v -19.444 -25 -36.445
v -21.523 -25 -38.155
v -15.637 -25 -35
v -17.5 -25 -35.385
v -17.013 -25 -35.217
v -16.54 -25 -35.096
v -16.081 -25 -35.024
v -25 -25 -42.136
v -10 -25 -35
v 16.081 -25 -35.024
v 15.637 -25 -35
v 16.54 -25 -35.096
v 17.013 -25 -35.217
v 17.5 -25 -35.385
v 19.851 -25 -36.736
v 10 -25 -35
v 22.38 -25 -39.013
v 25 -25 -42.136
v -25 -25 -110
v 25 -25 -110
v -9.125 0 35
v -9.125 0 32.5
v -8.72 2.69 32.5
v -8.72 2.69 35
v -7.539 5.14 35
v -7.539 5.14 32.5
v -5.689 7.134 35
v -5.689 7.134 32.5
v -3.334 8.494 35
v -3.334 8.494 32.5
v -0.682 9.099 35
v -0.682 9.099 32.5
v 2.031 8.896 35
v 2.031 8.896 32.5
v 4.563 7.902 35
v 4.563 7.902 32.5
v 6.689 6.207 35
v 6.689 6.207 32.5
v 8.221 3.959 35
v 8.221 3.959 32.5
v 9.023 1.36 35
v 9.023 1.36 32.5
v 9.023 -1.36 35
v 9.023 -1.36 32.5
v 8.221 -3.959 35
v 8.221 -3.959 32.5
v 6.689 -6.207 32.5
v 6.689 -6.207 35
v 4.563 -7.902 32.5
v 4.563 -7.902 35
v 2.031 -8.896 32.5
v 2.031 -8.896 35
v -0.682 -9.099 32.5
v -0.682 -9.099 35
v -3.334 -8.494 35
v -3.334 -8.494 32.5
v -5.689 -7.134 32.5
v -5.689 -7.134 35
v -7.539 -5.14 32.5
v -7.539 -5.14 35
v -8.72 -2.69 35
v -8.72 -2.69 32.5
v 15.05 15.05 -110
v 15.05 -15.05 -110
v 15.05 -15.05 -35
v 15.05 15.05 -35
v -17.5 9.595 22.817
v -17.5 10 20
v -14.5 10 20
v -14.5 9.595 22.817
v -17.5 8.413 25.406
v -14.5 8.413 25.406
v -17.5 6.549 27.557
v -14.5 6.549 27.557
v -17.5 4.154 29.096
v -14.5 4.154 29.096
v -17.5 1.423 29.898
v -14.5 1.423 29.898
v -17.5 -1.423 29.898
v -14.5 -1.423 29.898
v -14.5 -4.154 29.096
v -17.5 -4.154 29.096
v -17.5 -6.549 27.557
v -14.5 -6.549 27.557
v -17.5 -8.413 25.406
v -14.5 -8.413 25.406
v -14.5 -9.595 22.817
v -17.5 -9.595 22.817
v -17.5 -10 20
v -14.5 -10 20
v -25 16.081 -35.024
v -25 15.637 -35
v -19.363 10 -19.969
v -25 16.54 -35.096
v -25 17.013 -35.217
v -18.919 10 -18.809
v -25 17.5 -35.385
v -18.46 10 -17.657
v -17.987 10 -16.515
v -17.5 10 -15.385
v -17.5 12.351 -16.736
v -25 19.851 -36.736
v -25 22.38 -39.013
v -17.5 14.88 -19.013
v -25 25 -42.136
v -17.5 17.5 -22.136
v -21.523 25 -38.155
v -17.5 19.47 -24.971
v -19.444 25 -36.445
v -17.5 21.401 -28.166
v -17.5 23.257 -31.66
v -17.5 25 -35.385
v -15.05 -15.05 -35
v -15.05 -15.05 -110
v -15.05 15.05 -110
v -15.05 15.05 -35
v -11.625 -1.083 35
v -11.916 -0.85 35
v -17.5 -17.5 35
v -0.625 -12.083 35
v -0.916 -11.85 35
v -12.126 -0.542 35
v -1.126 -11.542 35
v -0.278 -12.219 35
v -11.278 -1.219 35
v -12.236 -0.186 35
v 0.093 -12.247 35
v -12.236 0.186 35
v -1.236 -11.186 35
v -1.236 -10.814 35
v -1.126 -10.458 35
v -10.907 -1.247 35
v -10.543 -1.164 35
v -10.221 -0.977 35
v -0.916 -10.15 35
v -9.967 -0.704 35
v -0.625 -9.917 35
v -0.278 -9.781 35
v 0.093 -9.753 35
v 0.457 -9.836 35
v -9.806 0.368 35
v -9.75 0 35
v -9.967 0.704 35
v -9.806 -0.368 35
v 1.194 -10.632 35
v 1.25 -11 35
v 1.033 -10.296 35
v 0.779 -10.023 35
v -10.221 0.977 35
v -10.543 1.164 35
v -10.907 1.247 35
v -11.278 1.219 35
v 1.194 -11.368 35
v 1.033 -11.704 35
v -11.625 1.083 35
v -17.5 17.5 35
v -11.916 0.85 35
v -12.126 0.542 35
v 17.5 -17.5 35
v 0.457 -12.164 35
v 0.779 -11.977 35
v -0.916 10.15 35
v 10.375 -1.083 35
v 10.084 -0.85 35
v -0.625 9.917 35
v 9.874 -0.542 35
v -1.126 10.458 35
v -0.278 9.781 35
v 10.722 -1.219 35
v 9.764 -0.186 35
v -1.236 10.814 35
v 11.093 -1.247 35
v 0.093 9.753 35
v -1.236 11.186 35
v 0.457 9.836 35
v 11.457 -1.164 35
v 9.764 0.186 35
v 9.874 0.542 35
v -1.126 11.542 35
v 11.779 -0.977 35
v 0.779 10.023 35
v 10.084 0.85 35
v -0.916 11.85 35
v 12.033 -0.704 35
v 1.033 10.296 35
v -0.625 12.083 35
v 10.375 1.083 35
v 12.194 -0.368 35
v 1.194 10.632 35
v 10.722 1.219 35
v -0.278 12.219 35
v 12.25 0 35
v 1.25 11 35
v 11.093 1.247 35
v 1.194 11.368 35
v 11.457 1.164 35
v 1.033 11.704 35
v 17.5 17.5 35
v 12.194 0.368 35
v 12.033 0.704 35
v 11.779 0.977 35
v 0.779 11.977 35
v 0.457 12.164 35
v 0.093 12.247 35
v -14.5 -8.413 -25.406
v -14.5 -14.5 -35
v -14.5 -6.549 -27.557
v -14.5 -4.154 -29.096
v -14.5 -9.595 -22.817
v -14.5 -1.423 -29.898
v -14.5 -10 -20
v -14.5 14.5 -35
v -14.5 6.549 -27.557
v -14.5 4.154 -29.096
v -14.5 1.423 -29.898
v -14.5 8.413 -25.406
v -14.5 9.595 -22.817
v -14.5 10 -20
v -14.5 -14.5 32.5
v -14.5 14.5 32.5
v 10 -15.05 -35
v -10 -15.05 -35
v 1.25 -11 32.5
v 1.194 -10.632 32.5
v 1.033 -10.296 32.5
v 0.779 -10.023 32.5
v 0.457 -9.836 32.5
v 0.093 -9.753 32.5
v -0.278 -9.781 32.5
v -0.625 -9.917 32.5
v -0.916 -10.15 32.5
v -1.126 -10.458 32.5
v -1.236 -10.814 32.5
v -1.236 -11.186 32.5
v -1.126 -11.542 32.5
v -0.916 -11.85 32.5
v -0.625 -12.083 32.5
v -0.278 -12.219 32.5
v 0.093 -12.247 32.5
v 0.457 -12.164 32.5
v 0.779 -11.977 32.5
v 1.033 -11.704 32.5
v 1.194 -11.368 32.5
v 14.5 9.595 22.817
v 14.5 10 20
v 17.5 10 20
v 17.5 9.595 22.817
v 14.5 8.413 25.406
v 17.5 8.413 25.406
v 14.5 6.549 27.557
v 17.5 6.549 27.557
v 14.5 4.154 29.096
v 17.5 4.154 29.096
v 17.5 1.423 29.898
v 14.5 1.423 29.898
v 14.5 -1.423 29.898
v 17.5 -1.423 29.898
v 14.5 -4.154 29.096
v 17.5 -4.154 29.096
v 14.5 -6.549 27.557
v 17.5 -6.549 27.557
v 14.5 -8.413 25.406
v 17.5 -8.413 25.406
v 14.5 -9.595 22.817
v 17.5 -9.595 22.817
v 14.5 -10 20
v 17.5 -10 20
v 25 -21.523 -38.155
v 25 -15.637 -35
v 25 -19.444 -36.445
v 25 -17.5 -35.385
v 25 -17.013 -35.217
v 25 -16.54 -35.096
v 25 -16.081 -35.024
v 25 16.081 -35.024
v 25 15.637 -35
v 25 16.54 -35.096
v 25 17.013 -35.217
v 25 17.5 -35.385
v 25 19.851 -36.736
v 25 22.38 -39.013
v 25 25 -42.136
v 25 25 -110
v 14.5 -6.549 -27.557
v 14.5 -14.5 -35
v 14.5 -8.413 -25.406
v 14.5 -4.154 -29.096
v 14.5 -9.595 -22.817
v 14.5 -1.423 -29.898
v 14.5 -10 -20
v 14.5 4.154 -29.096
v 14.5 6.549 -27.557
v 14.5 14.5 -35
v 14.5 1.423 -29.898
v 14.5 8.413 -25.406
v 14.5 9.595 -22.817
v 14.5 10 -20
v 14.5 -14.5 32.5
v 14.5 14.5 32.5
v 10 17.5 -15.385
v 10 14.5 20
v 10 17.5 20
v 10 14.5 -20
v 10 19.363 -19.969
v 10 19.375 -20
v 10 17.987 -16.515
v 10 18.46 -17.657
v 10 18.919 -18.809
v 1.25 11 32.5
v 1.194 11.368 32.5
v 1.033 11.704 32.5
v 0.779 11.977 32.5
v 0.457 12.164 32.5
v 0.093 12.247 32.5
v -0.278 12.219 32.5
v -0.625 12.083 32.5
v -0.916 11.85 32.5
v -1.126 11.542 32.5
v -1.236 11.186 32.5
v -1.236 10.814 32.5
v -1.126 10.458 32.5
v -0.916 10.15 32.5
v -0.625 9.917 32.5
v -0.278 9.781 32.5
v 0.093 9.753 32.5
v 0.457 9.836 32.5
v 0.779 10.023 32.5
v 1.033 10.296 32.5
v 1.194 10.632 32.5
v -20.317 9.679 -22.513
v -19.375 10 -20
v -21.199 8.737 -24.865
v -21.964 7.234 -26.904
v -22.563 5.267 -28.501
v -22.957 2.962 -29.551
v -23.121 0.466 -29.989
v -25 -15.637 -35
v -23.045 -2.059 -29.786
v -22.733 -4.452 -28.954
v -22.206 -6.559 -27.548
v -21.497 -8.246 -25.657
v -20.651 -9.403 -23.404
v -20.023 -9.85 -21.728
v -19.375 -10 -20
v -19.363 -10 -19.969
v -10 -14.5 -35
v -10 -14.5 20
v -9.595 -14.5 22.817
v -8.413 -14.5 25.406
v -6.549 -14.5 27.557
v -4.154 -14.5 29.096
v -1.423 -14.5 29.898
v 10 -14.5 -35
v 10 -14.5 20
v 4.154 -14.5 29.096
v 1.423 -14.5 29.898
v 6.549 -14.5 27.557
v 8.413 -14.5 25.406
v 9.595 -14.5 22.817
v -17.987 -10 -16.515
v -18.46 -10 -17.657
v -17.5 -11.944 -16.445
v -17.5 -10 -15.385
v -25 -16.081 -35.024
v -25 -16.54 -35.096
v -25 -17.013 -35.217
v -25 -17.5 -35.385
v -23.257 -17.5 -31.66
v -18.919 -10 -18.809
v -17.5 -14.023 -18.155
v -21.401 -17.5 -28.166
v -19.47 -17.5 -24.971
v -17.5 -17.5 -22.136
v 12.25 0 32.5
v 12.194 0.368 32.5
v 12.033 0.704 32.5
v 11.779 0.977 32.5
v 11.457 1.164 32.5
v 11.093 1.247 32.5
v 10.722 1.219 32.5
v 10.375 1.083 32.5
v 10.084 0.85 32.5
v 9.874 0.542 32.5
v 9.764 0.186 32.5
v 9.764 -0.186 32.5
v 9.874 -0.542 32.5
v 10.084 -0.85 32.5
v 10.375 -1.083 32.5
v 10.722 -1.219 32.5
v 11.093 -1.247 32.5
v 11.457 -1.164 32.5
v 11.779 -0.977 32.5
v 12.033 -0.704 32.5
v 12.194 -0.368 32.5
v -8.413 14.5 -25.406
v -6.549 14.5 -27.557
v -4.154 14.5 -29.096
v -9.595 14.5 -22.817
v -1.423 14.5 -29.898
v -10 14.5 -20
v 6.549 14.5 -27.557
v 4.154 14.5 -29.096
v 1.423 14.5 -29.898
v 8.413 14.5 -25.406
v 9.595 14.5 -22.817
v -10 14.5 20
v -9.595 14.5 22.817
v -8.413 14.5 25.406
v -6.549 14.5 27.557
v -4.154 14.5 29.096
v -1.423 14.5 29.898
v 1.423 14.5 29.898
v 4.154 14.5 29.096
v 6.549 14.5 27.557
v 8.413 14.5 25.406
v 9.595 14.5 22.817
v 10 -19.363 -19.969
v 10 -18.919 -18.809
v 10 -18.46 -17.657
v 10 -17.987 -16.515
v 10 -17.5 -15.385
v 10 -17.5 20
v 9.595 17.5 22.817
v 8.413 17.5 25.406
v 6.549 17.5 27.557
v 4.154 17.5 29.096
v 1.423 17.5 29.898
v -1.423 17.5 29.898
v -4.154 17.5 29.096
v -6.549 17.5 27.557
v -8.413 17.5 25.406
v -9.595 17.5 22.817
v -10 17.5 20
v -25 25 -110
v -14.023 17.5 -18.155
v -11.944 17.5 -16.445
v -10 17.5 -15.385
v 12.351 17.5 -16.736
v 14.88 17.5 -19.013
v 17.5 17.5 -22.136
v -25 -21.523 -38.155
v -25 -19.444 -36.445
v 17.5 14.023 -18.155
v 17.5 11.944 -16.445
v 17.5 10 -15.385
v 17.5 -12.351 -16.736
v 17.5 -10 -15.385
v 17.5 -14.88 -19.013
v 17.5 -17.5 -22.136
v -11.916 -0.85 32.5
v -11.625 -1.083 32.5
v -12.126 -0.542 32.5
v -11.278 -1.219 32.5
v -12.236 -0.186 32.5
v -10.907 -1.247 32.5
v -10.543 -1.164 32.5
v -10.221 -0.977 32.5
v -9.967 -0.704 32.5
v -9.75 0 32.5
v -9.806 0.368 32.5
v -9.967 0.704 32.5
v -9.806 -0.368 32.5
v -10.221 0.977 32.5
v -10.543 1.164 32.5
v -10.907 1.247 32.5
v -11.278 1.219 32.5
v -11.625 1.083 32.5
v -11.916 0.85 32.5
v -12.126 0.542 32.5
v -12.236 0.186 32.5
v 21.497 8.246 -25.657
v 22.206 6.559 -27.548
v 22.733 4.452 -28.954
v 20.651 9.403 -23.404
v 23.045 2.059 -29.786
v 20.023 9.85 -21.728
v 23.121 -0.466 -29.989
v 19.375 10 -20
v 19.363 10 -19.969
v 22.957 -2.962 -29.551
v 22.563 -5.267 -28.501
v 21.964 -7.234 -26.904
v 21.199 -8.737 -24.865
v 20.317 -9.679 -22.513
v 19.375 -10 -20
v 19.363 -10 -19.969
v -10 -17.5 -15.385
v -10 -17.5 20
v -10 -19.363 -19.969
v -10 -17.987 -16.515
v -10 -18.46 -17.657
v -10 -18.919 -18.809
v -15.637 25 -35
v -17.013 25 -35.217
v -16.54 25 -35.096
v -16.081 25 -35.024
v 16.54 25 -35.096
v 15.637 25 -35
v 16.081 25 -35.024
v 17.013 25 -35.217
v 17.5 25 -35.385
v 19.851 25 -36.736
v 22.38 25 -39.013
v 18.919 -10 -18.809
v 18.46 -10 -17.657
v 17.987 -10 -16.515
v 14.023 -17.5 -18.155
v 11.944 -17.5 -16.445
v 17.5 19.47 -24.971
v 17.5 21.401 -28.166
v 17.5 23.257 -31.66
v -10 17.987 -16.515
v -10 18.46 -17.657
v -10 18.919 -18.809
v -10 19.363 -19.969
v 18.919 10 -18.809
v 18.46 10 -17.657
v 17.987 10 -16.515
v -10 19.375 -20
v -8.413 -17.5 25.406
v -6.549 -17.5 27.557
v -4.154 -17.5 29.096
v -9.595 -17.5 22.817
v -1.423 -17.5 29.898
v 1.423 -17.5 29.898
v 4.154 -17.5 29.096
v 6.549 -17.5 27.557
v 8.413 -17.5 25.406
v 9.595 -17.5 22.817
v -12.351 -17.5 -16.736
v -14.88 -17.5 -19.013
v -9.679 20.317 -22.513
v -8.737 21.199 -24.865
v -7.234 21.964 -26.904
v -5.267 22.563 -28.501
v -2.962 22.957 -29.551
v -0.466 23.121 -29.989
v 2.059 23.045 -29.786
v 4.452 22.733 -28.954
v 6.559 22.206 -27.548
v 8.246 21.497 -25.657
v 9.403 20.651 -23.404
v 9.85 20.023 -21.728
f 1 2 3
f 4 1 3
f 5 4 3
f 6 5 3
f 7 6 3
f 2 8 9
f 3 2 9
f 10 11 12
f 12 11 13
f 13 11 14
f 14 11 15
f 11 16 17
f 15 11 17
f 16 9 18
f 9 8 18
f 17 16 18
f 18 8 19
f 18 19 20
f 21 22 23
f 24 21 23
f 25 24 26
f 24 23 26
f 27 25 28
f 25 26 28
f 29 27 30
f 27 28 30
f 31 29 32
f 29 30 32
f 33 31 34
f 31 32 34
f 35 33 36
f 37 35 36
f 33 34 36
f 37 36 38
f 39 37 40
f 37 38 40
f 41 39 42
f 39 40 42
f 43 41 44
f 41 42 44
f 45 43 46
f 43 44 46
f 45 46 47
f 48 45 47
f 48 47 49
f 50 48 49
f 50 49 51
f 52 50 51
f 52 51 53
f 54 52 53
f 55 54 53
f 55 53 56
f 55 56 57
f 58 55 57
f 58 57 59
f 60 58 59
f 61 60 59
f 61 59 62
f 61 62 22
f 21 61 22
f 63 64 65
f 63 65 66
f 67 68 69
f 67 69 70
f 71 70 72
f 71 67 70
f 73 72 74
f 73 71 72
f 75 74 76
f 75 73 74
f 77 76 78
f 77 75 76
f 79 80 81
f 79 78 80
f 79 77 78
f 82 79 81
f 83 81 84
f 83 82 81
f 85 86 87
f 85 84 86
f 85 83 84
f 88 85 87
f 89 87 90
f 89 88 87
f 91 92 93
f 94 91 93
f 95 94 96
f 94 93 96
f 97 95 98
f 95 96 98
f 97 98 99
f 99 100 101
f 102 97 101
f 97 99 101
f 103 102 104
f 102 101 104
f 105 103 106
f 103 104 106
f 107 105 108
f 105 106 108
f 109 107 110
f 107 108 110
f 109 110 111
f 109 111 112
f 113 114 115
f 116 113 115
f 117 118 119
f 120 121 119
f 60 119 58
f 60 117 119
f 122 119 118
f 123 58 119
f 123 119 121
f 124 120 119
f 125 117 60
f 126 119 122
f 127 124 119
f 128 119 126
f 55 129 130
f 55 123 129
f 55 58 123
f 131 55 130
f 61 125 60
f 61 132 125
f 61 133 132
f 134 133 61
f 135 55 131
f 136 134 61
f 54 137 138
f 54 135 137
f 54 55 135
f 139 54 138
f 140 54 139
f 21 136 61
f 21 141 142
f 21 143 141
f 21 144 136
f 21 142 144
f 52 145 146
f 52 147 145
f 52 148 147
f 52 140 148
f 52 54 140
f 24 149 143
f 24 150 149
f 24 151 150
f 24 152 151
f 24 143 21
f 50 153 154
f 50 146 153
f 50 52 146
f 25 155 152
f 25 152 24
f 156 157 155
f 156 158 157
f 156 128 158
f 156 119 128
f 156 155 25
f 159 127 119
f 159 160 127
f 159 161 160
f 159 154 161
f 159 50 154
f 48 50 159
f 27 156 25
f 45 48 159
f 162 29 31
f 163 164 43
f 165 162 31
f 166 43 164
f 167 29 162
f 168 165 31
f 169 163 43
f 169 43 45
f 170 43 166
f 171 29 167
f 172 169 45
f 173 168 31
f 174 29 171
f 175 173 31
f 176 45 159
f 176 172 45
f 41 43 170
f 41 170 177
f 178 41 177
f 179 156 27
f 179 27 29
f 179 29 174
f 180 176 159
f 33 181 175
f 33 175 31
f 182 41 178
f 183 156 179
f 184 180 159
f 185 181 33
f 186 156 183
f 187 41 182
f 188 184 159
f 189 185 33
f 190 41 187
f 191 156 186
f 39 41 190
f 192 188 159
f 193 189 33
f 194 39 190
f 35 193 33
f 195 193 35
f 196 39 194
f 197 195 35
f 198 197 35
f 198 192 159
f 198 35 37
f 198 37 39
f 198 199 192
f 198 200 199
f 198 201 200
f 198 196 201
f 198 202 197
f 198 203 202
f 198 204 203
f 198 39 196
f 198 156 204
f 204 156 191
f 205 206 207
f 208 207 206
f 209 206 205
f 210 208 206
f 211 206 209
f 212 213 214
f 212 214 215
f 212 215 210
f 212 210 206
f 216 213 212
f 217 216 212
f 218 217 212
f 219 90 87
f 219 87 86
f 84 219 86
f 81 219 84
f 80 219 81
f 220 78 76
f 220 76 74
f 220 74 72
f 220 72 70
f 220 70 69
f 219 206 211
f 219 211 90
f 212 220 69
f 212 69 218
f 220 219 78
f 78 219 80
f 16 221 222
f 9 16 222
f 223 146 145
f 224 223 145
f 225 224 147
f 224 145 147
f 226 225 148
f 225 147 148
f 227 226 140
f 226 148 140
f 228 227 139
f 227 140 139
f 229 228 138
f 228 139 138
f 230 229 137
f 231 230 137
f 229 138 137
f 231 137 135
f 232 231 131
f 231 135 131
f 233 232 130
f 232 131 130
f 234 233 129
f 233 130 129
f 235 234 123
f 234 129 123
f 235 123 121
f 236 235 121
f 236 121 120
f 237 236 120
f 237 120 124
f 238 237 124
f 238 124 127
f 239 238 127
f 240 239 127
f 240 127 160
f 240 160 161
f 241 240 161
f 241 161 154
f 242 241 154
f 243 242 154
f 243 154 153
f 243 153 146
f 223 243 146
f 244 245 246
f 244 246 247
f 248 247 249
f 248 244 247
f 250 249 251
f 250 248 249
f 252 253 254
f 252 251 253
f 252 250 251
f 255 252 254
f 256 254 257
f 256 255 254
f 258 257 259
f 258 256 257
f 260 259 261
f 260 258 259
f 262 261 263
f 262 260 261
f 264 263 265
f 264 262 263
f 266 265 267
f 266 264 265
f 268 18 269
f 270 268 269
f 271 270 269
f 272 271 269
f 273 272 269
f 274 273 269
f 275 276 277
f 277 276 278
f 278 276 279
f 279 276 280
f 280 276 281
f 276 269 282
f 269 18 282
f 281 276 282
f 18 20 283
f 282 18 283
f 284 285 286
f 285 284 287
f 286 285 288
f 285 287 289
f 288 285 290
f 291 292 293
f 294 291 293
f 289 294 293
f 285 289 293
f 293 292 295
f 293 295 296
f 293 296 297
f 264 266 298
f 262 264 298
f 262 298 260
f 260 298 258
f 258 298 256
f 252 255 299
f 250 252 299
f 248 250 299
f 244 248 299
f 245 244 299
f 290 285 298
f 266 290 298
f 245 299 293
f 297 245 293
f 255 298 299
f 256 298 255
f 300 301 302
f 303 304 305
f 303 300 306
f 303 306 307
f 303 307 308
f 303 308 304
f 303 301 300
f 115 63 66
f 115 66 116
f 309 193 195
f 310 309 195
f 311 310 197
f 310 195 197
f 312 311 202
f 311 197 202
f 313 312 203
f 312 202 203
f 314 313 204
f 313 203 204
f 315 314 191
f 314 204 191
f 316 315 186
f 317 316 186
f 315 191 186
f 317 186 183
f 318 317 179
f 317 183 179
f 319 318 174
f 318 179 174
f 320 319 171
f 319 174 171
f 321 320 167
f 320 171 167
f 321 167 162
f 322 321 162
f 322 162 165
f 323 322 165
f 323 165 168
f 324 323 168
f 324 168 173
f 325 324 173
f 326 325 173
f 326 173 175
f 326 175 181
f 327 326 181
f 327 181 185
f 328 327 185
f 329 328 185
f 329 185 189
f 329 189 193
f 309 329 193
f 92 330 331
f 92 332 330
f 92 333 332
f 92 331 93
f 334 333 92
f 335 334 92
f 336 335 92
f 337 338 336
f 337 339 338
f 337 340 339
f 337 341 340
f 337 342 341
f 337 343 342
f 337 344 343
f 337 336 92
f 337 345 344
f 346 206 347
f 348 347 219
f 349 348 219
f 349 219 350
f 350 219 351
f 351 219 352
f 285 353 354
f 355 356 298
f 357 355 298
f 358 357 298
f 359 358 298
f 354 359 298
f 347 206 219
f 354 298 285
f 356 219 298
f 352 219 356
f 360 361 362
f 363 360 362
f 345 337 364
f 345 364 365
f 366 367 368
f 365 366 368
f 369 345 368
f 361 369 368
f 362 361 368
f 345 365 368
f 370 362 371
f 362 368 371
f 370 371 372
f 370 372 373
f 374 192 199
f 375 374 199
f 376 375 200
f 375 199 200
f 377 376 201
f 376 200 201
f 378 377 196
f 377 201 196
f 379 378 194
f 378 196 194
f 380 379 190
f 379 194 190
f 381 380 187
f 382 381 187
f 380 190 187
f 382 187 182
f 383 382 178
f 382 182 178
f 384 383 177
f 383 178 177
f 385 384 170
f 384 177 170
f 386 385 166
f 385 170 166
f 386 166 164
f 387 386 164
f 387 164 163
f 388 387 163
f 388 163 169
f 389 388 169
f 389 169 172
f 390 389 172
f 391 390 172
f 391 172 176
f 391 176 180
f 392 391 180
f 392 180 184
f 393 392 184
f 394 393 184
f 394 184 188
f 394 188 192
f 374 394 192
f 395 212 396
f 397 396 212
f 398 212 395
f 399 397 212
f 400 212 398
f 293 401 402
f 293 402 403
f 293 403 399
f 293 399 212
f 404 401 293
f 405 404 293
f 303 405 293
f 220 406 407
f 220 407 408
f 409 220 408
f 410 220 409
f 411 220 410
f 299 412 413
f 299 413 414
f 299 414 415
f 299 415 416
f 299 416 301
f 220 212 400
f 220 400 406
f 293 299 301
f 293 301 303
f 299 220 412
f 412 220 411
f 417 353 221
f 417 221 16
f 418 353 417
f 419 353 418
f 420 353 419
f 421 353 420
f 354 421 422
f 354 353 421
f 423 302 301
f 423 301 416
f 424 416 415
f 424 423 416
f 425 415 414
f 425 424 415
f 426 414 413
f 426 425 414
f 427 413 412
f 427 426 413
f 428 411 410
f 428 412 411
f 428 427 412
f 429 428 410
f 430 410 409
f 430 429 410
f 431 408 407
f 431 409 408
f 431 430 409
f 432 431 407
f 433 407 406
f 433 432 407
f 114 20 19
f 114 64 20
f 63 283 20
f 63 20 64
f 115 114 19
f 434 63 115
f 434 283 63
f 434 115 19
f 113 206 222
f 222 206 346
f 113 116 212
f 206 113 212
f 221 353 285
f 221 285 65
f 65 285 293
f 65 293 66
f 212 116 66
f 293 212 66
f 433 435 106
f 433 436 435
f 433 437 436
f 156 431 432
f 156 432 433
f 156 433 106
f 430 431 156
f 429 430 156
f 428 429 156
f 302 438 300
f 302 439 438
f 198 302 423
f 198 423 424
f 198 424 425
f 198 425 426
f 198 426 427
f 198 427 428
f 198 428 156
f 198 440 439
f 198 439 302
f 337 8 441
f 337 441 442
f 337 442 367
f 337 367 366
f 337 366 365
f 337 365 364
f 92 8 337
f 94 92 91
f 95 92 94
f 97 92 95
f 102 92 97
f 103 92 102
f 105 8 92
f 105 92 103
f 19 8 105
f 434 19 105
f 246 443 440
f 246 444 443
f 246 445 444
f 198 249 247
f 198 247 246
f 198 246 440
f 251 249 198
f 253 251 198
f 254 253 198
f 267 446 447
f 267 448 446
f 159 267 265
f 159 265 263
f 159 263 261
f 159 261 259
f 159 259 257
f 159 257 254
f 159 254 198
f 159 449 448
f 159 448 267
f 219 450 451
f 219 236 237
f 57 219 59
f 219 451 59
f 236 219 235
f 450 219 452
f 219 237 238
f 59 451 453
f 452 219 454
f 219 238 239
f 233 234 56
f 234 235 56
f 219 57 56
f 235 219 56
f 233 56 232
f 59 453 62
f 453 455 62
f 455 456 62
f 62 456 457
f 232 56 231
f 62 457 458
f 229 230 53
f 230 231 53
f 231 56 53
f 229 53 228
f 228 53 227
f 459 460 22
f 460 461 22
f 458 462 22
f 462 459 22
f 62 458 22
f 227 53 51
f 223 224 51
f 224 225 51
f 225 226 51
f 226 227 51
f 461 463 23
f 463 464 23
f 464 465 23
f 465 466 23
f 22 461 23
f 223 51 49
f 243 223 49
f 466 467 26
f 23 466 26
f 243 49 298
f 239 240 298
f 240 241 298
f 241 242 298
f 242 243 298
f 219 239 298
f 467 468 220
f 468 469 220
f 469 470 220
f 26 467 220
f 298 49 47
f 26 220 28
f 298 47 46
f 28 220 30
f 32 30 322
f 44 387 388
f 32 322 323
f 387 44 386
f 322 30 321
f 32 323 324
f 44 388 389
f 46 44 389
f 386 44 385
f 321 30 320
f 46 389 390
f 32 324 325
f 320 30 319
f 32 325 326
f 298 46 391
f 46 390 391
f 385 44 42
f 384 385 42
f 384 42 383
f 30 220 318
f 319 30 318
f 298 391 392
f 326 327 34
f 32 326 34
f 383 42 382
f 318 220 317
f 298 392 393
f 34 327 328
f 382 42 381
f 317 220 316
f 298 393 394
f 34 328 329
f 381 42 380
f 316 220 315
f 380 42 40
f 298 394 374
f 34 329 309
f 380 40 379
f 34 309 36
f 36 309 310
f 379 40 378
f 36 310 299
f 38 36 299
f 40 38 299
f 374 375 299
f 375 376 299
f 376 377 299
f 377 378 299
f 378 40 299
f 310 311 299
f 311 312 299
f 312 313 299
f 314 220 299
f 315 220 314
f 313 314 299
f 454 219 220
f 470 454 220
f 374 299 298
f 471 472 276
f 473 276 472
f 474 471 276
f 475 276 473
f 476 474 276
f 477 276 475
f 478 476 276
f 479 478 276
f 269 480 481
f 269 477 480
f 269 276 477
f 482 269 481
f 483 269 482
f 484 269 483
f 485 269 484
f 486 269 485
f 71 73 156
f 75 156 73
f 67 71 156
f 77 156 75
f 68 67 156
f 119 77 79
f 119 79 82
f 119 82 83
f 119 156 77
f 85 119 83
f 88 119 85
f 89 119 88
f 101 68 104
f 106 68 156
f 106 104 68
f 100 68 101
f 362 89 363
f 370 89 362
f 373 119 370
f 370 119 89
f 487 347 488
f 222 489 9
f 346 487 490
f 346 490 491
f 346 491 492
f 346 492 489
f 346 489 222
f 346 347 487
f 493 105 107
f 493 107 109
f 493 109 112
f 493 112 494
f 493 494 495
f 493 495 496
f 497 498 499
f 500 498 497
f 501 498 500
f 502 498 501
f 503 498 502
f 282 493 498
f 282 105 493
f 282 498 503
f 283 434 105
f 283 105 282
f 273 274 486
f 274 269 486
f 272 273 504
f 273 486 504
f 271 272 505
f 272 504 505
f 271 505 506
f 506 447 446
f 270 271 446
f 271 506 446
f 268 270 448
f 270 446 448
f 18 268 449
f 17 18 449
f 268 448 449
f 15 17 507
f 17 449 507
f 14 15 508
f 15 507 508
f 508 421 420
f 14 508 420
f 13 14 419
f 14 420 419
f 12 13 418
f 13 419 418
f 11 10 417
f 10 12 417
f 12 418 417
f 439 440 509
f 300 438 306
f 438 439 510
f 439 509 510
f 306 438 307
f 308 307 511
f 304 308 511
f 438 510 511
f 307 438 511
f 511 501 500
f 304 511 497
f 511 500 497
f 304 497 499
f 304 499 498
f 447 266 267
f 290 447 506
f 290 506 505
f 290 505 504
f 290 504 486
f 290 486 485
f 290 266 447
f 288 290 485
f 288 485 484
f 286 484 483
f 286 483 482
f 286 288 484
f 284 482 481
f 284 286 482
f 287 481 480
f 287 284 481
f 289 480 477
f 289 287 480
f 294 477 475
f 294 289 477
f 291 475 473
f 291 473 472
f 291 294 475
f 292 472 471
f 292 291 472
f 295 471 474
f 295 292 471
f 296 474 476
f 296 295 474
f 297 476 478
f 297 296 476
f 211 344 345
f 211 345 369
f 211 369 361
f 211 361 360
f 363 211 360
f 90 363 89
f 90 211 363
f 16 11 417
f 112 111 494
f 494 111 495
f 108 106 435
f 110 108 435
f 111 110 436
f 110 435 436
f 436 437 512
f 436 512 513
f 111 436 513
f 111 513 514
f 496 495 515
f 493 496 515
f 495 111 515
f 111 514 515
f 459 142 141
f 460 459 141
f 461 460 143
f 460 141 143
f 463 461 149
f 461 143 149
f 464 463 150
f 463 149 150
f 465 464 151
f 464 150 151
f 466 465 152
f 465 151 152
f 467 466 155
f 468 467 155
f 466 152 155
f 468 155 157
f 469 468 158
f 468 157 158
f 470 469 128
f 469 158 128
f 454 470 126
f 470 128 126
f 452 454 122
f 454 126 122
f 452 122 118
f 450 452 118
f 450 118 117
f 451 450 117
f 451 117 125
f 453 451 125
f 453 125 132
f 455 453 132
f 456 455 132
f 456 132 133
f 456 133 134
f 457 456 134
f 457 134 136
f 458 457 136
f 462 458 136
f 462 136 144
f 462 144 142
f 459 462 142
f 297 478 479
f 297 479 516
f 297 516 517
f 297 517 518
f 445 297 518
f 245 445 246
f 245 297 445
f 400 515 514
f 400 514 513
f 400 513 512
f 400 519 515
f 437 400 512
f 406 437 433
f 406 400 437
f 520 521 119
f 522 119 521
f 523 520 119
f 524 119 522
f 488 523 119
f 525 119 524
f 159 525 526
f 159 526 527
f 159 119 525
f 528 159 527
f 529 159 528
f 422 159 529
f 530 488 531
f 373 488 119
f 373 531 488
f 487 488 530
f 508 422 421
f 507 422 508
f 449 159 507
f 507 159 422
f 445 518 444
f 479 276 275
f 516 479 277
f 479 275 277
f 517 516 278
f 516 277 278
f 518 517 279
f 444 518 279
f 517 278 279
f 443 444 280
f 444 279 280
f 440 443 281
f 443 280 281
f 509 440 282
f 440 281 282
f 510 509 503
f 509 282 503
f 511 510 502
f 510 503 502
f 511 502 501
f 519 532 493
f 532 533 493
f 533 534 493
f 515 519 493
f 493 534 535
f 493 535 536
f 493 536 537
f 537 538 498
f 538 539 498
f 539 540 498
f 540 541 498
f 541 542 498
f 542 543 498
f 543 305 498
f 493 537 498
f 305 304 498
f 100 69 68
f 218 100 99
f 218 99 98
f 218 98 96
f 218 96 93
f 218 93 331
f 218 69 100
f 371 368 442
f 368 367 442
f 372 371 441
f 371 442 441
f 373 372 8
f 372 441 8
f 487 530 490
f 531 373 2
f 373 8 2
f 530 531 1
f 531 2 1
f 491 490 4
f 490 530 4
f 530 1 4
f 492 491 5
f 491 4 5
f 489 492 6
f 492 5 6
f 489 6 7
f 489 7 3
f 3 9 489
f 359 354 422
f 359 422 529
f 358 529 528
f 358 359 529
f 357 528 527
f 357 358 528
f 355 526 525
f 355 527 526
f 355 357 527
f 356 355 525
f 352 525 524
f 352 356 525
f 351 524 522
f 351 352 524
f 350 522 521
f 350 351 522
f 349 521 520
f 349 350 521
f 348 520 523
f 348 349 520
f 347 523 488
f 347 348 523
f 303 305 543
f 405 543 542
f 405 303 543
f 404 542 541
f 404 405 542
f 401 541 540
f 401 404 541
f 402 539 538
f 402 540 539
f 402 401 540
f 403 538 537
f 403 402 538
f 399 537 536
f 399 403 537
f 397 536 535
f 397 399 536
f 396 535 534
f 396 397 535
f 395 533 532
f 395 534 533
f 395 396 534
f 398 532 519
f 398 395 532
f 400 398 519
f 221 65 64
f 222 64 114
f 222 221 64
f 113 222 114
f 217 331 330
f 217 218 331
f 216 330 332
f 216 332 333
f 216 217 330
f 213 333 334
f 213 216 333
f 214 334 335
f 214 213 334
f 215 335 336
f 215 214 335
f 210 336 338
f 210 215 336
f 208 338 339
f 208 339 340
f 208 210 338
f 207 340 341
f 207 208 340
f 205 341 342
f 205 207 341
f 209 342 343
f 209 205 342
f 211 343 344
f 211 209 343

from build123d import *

# Parameters (mm, degrees)
IZIM1_W                     = 35
IZIM1_H                     = 35
IZIM1_W_2                   = 29
IZIM1_H_2                   = 29
Y_KSEKLIK_EKSTR_ZYON1_DEPTH = 35
IZIM2_W                     = 35
IZIM2_H                     = 35
Y_KSEKLIK_EKSTR_ZYON2_DEPTH = 2.5
IZIM7_R                     = 1.25
KES_EKSTR_ZYON5_DEPTH       = 75.246212025
IZIM5_R                     = 9.125
KES_EKSTR_ZYON3_DEPTH       = 72.894019223
IZIM10_W                    = 50
IZIM10_H                    = 50
IZIM10_W_2                  = 30.1
IZIM10_H_2                  = 30.1
Y_KSEKLIK_EKSTR_ZYON3_DEPTH = 75
IZIM12_W                    = 50
IZIM12_H                    = 50
IZIM12_W_2                  = 35
IZIM12_H_2                  = 35
Y_KSEKLIK_EKSTR_ZYON4_DEPTH = 20
KES_EKSTR_ZYON1_DEPTH       = 121.545634512
KES_EKSTR_ZYON6_START       = -10
KES_EKSTR_ZYON6_DEPTH       = 10
DAIRESEL_KAPLAMA1_COUNT     = 4
KES_EKSTR_ZYON7_DEPTH       = 124.389626793
KES_EKSTR_ZYON8_DEPTH       = 124.389626793
RADYUS4_R                   = 10
KES_EKSTR_ZYON9_DEPTH       = 121.545634512


with BuildPart() as part:
    # Çizim1 → Yükseklik-Ekstrüzyon1 (new, symmetric)
    with BuildSketch(Plane.XY):
        Rectangle(IZIM1_W, IZIM1_H)
        Rectangle(IZIM1_W_2, IZIM1_H_2, mode=Mode.SUBTRACT)
    extrude(amount=Y_KSEKLIK_EKSTR_ZYON1_DEPTH, both=True)

    # Çizim2 → Yükseklik-Ekstrüzyon2 (add)
    with BuildSketch(Plane.XY.offset(35)):
        Rectangle(IZIM2_W, IZIM2_H)
    extrude(amount=-Y_KSEKLIK_EKSTR_ZYON2_DEPTH)

    # Çizim7 → Kes-Ekstrüzyon5 (cut, through all)
    with BuildSketch(Plane.XY.offset(35)):
        with Locations((-11, 0)):
            Circle(IZIM7_R)
        with Locations((11, 0)):
            Circle(IZIM7_R)
        with Locations((0, 11)):
            Circle(IZIM7_R)
        with Locations((0, -11)):
            Circle(IZIM7_R)
    extrude(amount=-KES_EKSTR_ZYON5_DEPTH, mode=Mode.SUBTRACT)

    # Çizim5 → Kes-Ekstrüzyon3 (cut, through all)
    with BuildSketch(Plane(origin=(0, 0, 32.5), x_dir=(-1, 0, 0), z_dir=(0, 0, -1))):
        Circle(IZIM5_R)
    extrude(amount=-KES_EKSTR_ZYON3_DEPTH, mode=Mode.SUBTRACT)



with BuildPart() as body_2:
    # Çizim10 → Yükseklik-Ekstrüzyon3 (new body)
    with BuildSketch(Plane(origin=(0, 0, -35), x_dir=(-1, 0, 0), z_dir=(0, 0, -1))):
        Rectangle(IZIM10_W, IZIM10_H)
        Rectangle(IZIM10_W_2, IZIM10_H_2, mode=Mode.SUBTRACT)
    extrude(amount=Y_KSEKLIK_EKSTR_ZYON3_DEPTH)


with BuildPart() as part_1:
    add(part.part)

    add(body_2.part)  # Yükseklik-Ekstrüzyon4 merges body 2
    # Çizim12 → Yükseklik-Ekstrüzyon4 (add)
    with BuildSketch(Plane.XY.offset(-35)):
        Rectangle(IZIM12_W, IZIM12_H)
        Rectangle(IZIM12_W_2, IZIM12_H_2, mode=Mode.SUBTRACT)
    extrude(amount=Y_KSEKLIK_EKSTR_ZYON4_DEPTH)

    # Çizim3 → Kes-Ekstrüzyon1 (cut, through all)
    with BuildSketch(Plane(origin=(0, 17.5, 0), x_dir=(1, 0, 0), z_dir=(0, 1, 0))):
        with BuildLine():
            Line((10, 20), (10, -20))
            ThreePointArc((10, -20), (0, -30), (-10, -20))
            Line((-10, -20), (-10, 20))
            ThreePointArc((-10, 20), (0, 30), (10, 20))
        make_face()
    kes_ekstr_zyon1 = extrude(amount=-KES_EKSTR_ZYON1_DEPTH, mode=Mode.SUBTRACT)

    # Çizim8 → Kes-Ekstrüzyon6 (cut)
    with BuildSketch(Plane.XZ.offset(17.5).offset(KES_EKSTR_ZYON6_START)):
        with BuildLine():
            Line((-10, -20), (-10, -35))
            Line((-10, -35), (10, -35))
            Line((10, -35), (10, -20))
            ThreePointArc((10, -20), (0, -30), (-10, -20))
        make_face()
    extrude(amount=KES_EKSTR_ZYON6_DEPTH, mode=Mode.SUBTRACT)

    # Dairesel Kaplama1: Kes-Ekstrüzyon1 ×4 about axis
    dairesel_kaplama1_axis = Axis((0, 0, 0), (0, 0, 1))
    for i in range(1, DAIRESEL_KAPLAMA1_COUNT):
        add(kes_ekstr_zyon1.rotate(dairesel_kaplama1_axis, i * 360 / DAIRESEL_KAPLAMA1_COUNT), mode=Mode.SUBTRACT)

    # Çizim13 → Kes-Ekstrüzyon7 (cut, through all)
    with BuildSketch(Plane(origin=(25, 0, 0), x_dir=(0, 0, -1), z_dir=(1, 0, 0))):
        Polygon((15, 25), (15, 17.5), (35, 25), align=None)
        Polygon((15, -17.5), (15, -25), (35, -25), align=None)
    extrude(amount=-KES_EKSTR_ZYON7_DEPTH, mode=Mode.SUBTRACT)

    # Çizim14 → Kes-Ekstrüzyon8 (cut, through all)
    with BuildSketch(Plane.XZ.offset(25)):
        Polygon((-17.5, -15), (-25, -35), (-25, -15), align=None)
        Polygon((17.5, -15), (25, -15), (25, -35), align=None)
    extrude(amount=-KES_EKSTR_ZYON8_DEPTH, mode=Mode.SUBTRACT)

    # Radyus4
    # the kernel refuses this fillet: 10 mm, written as the material it takes off along each edge
    with BuildSketch(Plane(origin=(32.317073171, 32.317073171, -54.512195122), x_dir=(-0.9435273723846194, 0.11632529248577513, -0.31020077996206696), z_dir=(-0.33129457822453995, -0.3312945782245377, 0.883452208598773))) as radyus4_piece_1_section:
        with BuildLine():
            CenterArc((RADYUS4_R * 0.883452208599, RADYUS4_R), RADYUS4_R, 187.08188169, 82.91811831)
            Line((-RADYUS4_R * 0.108918765444, RADYUS4_R * 0.876712328767), (0, 0))
            Line((0, 0), (RADYUS4_R * 0.883452208599, 0))
        make_face()
    radyus4_piece_1 = extrude(amount=66.811073275, mode=Mode.PRIVATE)
    radyus4_piece_1 = split(radyus4_piece_1, bisect_by=Plane(origin=(17.5, 21.25, -29.89398757), z_dir=(1, 0, 0)), keep=Keep.TOP, mode=Mode.PRIVATE)
    add(radyus4_piece_1, mode=Mode.SUBTRACT)
    with BuildSketch(Plane(origin=(32.317073171, 32.317073171, -54.512195122), x_dir=(-0.9435273723846194, 0.11632529248577513, -0.31020077996206696), z_dir=(-0.33129457822453995, -0.3312945782245377, 0.883452208598773))) as radyus4_piece_2_section:
        with BuildLine():
            CenterArc((RADYUS4_R * 0.883452208599, RADYUS4_R), RADYUS4_R, 187.08188169, 82.91811831)
            Line((-RADYUS4_R * 0.108918765444, RADYUS4_R * 0.876712328767), (0, 0))
            Line((0, 0), (RADYUS4_R * 0.883452208599, 0))
        make_face()
    radyus4_piece_2 = extrude(amount=66.811073275, mode=Mode.PRIVATE)
    radyus4_piece_2 = split(radyus4_piece_2, bisect_by=Plane(origin=(16.256655696, 17.5, -22.379324277), z_dir=(0, 1, 0)), keep=Keep.TOP, mode=Mode.PRIVATE)
    add(radyus4_piece_2, mode=Mode.SUBTRACT)
    with BuildSketch(Plane(origin=(-10.182926829, 10.182926829, 4.512195122), x_dir=(0.943527372384614, 0.11632529248577986, -0.3102007799620813), z_dir=(-0.33129457822455505, 0.3312945782245359, -0.883452208598768))) as radyus4_piece_3_section:
        with BuildLine():
            CenterArc((RADYUS4_R * 0.883452208599, RADYUS4_R), RADYUS4_R, 187.08188169, 82.91811831)
            Line((-RADYUS4_R * 0.108918765444, RADYUS4_R * 0.876712328767), (0, 0))
            Line((0, 0), (RADYUS4_R * 0.883452208599, 0))
        make_face()
    radyus4_piece_3 = extrude(amount=66.811073275, mode=Mode.PRIVATE)
    radyus4_piece_3 = split(radyus4_piece_3, bisect_by=Plane(origin=(-17.5, 13.216664443, -19.287647888), z_dir=(-1, 0, 0)), keep=Keep.TOP, mode=Mode.PRIVATE)
    add(radyus4_piece_3, mode=Mode.SUBTRACT)
    with BuildSketch(Plane(origin=(-10.182926829, 10.182926829, 4.512195122), x_dir=(0.943527372384614, 0.11632529248577986, -0.3102007799620813), z_dir=(-0.33129457822455505, 0.3312945782245359, -0.883452208598768))) as radyus4_piece_4_section:
        with BuildLine():
            CenterArc((RADYUS4_R * 0.883452208599, RADYUS4_R), RADYUS4_R, 187.08188169, 82.91811831)
            Line((-RADYUS4_R * 0.108918765444, RADYUS4_R * 0.876712328767), (0, 0))
            Line((0, 0), (RADYUS4_R * 0.883452208599, 0))
        make_face()
    radyus4_piece_4 = extrude(amount=66.811073275, mode=Mode.PRIVATE)
    radyus4_piece_4 = split(radyus4_piece_4, bisect_by=Plane(origin=(-13.216664444, 17.5, -19.287647888), z_dir=(0, 1, 0)), keep=Keep.TOP, mode=Mode.PRIVATE)
    add(radyus4_piece_4, mode=Mode.SUBTRACT)
    with BuildSketch(Plane(origin=(10.182926829, -10.182926829, 4.512195122), x_dir=(0.11632529248577561, 0.9435273723846188, -0.3102007799620686), z_dir=(0.33129457822453945, -0.3312945782245416, -0.8834522085987717))) as radyus4_piece_5_section:
        with BuildLine():
            CenterArc((RADYUS4_R * 0.883452208599, -RADYUS4_R), RADYUS4_R, 90, 82.91811831)
            Line((-RADYUS4_R * 0.108918765444, -RADYUS4_R * 0.876712328767), (0, 0))
            Line((0, 0), (RADYUS4_R * 0.883452208599, 0))
        make_face()
    radyus4_piece_5 = extrude(amount=66.811073275, mode=Mode.PRIVATE)
    radyus4_piece_5 = split(radyus4_piece_5, bisect_by=Plane(origin=(13.216664443, -17.5, -19.287647888), z_dir=(0, -1, 0)), keep=Keep.TOP, mode=Mode.PRIVATE)
    add(radyus4_piece_5, mode=Mode.SUBTRACT)
    with BuildSketch(Plane(origin=(10.182926829, -10.182926829, 4.512195122), x_dir=(0.11632529248577561, 0.9435273723846188, -0.3102007799620686), z_dir=(0.33129457822453945, -0.3312945782245416, -0.8834522085987717))) as radyus4_piece_6_section:
        with BuildLine():
            CenterArc((RADYUS4_R * 0.883452208599, -RADYUS4_R), RADYUS4_R, 90, 82.91811831)
            Line((-RADYUS4_R * 0.108918765444, -RADYUS4_R * 0.876712328767), (0, 0))
            Line((0, 0), (RADYUS4_R * 0.883452208599, 0))
        make_face()
    radyus4_piece_6 = extrude(amount=66.811073275, mode=Mode.PRIVATE)
    radyus4_piece_6 = split(radyus4_piece_6, bisect_by=Plane(origin=(17.5, -13.216664444, -19.287647888), z_dir=(1, 0, 0)), keep=Keep.TOP, mode=Mode.PRIVATE)
    add(radyus4_piece_6, mode=Mode.SUBTRACT)
    with BuildSketch(Plane(origin=(-32.317073171, -32.317073171, -54.512195122), x_dir=(-0.11632529248578077, 0.9435273723846194, -0.31020077996206435), z_dir=(0.33129457822455455, 0.33129457822453956, 0.8834522085987668))) as radyus4_piece_7_section:
        with BuildLine():
            CenterArc((RADYUS4_R * 0.883452208599, -RADYUS4_R), RADYUS4_R, 90, 82.91811831)
            Line((-RADYUS4_R * 0.108918765444, -RADYUS4_R * 0.876712328767), (0, 0))
            Line((0, 0), (RADYUS4_R * 0.883452208599, 0))
        make_face()
    radyus4_piece_7 = extrude(amount=66.811073275, mode=Mode.PRIVATE)
    radyus4_piece_7 = split(radyus4_piece_7, bisect_by=Plane(origin=(-21.25, -17.5, -29.89398757), z_dir=(0, -1, 0)), keep=Keep.TOP, mode=Mode.PRIVATE)
    add(radyus4_piece_7, mode=Mode.SUBTRACT)
    with BuildSketch(Plane(origin=(-32.317073171, -32.317073171, -54.512195122), x_dir=(-0.11632529248578077, 0.9435273723846194, -0.31020077996206435), z_dir=(0.33129457822455455, 0.33129457822453956, 0.8834522085987668))) as radyus4_piece_8_section:
        with BuildLine():
            CenterArc((RADYUS4_R * 0.883452208599, -RADYUS4_R), RADYUS4_R, 90, 82.91811831)
            Line((-RADYUS4_R * 0.108918765444, -RADYUS4_R * 0.876712328767), (0, 0))
            Line((0, 0), (RADYUS4_R * 0.883452208599, 0))
        make_face()
    radyus4_piece_8 = extrude(amount=66.811073275, mode=Mode.PRIVATE)
    radyus4_piece_8 = split(radyus4_piece_8, bisect_by=Plane(origin=(-17.5, -16.256655696, -22.379324277), z_dir=(-1, 0, 0)), keep=Keep.TOP, mode=Mode.PRIVATE)
    add(radyus4_piece_8, mode=Mode.SUBTRACT)

    # Çizim15 → Kes-Ekstrüzyon9 (cut, through all)
    with BuildSketch(Plane(origin=(0, -17.5, 0), x_dir=(1, 0, 0), z_dir=(0, 1, 0))):
        with BuildLine():
            Line((10, 20), (10, 35))
            Line((10, 35), (-10, 35))
            Line((-10, 35), (-10, 20))
            ThreePointArc((-10, 20), (0, 30), (10, 20))
        make_face()
    extrude(amount=-KES_EKSTR_ZYON9_DEPTH, mode=Mode.SUBTRACT)


solid = part_1.part
